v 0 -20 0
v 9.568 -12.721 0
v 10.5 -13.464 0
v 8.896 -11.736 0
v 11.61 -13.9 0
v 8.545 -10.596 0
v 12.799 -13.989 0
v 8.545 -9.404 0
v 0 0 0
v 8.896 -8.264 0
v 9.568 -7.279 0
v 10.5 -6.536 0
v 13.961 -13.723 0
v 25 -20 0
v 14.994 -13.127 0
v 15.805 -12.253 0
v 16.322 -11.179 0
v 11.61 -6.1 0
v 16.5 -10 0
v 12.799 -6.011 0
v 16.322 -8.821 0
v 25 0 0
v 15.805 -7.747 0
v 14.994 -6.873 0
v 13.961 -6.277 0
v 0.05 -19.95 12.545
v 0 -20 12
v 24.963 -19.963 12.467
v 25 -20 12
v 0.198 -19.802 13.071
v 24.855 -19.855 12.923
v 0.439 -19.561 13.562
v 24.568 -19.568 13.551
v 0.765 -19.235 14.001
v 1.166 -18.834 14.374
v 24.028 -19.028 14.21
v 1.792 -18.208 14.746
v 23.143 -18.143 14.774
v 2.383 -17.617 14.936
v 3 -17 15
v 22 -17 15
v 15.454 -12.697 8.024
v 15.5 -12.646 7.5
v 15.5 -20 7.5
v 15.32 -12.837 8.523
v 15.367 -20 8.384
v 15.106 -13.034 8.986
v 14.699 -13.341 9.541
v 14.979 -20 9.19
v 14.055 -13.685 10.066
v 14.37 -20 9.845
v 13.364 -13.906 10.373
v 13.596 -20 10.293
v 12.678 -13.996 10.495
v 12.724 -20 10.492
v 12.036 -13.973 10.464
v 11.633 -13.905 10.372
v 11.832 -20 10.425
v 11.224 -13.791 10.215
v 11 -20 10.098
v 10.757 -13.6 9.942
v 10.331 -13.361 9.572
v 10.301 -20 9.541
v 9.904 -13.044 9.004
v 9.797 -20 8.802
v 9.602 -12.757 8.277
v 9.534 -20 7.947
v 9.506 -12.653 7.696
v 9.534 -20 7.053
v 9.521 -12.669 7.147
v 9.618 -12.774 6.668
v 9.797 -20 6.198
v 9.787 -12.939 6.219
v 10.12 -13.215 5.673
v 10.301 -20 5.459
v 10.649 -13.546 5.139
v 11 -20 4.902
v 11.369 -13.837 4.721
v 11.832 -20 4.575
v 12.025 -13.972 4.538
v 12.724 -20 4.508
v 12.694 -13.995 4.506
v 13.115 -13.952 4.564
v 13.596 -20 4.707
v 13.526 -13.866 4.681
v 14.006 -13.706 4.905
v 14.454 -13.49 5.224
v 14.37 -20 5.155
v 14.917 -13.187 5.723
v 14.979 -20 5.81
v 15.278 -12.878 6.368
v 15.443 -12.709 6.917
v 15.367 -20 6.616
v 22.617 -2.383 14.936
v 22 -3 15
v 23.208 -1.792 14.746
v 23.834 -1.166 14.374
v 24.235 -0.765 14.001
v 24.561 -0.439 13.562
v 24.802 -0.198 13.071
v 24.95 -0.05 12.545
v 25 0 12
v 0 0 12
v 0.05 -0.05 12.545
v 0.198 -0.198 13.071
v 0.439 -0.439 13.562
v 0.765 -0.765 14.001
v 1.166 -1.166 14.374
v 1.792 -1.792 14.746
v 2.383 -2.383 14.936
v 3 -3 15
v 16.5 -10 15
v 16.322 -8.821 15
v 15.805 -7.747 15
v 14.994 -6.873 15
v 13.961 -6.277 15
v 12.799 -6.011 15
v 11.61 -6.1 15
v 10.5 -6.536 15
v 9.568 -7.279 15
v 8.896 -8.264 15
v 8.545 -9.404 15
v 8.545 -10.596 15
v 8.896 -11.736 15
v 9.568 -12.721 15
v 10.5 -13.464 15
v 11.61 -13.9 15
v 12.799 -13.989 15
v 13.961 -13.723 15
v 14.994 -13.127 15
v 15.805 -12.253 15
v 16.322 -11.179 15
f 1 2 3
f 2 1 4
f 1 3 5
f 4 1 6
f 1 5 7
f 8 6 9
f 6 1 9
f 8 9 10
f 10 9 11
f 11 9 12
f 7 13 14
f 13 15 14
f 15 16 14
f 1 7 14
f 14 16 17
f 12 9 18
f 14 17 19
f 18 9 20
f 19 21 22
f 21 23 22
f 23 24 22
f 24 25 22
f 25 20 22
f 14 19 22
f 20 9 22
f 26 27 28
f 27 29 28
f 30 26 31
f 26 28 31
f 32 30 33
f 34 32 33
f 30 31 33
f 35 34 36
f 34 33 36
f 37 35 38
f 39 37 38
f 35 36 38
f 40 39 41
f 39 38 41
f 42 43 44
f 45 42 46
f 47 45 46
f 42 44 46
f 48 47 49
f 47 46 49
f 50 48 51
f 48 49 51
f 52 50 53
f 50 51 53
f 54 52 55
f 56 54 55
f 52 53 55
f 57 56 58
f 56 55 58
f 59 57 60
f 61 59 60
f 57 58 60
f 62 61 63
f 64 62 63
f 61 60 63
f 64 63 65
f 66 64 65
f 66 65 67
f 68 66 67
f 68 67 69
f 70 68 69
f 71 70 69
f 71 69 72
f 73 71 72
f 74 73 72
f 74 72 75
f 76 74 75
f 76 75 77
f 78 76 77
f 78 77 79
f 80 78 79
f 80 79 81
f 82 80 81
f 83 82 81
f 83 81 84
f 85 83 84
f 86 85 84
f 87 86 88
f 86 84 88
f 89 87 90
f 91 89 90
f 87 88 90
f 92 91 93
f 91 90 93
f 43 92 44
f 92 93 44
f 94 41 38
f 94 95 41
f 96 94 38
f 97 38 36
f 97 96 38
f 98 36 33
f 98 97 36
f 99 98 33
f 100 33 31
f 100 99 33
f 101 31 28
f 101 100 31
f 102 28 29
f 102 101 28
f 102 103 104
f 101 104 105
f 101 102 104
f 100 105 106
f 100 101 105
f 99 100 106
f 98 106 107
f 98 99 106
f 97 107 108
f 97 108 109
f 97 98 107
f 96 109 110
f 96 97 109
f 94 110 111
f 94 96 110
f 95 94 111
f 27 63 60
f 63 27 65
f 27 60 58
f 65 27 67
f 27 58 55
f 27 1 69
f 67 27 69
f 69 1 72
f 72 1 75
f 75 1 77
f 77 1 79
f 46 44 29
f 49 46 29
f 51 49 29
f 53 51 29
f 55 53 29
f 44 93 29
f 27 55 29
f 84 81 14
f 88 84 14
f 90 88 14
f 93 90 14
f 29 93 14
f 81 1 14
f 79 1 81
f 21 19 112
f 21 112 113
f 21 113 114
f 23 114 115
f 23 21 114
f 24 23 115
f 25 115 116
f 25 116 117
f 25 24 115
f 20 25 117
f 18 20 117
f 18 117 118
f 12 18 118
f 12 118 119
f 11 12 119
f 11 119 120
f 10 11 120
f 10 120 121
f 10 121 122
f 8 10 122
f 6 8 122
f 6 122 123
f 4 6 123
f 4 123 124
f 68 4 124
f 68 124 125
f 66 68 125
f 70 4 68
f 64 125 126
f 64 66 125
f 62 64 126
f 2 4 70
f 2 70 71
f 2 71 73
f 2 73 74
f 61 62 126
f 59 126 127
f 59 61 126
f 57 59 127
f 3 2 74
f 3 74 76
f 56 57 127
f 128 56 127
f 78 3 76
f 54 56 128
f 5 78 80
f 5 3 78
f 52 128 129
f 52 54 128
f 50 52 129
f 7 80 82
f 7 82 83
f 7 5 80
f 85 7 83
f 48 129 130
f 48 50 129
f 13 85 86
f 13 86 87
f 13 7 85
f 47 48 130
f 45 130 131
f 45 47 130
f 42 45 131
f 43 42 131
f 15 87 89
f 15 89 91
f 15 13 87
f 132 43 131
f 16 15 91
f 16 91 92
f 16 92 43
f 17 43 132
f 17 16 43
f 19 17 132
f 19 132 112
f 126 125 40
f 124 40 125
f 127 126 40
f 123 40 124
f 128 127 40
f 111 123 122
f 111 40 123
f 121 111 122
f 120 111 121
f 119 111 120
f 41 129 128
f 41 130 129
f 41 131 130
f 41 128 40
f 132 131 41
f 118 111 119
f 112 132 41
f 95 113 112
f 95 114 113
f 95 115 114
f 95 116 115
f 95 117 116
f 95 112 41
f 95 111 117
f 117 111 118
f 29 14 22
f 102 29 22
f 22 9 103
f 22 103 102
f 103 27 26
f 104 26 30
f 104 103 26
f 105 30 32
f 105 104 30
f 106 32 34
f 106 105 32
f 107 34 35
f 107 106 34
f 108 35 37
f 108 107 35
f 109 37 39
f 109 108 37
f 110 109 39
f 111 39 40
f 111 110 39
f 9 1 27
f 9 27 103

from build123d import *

# Parameters (mm, degrees)
F0_W     = 25
F0_H     = 20
F0_R     = 4
F1_DEPTH = 15
F2_R     = 3
F3_DEPTH = 10
F4_R     = 3


with BuildPart() as f1:
    # F0 (on Top) → F1 (new body)
    with BuildSketch(Plane.XY):
        with Locations((12.5, -10)):
            Rectangle(F0_W, F0_H)
        with Locations((12.5, -10)):
            Circle(F0_R, mode=Mode.SUBTRACT)
    extrude(amount=F1_DEPTH)

    # F2 (on face) → F3 (cut)
    with BuildSketch(Plane.XZ.offset(20)):
        with Locations((12.5, 7.5)):
            Circle(F2_R)
    extrude(amount=-F3_DEPTH, mode=Mode.SUBTRACT)

    # F4
    f4_edges = [f1.edges().sort_by_distance(p)[0] for p in [
        (0, -10, 15),
        (12.5, 0, 15),
        (25, -10, 15),
        (12.5, -20, 15),
    ]]
    fillet(f4_edges, radius=F4_R)


solid = f1.part
